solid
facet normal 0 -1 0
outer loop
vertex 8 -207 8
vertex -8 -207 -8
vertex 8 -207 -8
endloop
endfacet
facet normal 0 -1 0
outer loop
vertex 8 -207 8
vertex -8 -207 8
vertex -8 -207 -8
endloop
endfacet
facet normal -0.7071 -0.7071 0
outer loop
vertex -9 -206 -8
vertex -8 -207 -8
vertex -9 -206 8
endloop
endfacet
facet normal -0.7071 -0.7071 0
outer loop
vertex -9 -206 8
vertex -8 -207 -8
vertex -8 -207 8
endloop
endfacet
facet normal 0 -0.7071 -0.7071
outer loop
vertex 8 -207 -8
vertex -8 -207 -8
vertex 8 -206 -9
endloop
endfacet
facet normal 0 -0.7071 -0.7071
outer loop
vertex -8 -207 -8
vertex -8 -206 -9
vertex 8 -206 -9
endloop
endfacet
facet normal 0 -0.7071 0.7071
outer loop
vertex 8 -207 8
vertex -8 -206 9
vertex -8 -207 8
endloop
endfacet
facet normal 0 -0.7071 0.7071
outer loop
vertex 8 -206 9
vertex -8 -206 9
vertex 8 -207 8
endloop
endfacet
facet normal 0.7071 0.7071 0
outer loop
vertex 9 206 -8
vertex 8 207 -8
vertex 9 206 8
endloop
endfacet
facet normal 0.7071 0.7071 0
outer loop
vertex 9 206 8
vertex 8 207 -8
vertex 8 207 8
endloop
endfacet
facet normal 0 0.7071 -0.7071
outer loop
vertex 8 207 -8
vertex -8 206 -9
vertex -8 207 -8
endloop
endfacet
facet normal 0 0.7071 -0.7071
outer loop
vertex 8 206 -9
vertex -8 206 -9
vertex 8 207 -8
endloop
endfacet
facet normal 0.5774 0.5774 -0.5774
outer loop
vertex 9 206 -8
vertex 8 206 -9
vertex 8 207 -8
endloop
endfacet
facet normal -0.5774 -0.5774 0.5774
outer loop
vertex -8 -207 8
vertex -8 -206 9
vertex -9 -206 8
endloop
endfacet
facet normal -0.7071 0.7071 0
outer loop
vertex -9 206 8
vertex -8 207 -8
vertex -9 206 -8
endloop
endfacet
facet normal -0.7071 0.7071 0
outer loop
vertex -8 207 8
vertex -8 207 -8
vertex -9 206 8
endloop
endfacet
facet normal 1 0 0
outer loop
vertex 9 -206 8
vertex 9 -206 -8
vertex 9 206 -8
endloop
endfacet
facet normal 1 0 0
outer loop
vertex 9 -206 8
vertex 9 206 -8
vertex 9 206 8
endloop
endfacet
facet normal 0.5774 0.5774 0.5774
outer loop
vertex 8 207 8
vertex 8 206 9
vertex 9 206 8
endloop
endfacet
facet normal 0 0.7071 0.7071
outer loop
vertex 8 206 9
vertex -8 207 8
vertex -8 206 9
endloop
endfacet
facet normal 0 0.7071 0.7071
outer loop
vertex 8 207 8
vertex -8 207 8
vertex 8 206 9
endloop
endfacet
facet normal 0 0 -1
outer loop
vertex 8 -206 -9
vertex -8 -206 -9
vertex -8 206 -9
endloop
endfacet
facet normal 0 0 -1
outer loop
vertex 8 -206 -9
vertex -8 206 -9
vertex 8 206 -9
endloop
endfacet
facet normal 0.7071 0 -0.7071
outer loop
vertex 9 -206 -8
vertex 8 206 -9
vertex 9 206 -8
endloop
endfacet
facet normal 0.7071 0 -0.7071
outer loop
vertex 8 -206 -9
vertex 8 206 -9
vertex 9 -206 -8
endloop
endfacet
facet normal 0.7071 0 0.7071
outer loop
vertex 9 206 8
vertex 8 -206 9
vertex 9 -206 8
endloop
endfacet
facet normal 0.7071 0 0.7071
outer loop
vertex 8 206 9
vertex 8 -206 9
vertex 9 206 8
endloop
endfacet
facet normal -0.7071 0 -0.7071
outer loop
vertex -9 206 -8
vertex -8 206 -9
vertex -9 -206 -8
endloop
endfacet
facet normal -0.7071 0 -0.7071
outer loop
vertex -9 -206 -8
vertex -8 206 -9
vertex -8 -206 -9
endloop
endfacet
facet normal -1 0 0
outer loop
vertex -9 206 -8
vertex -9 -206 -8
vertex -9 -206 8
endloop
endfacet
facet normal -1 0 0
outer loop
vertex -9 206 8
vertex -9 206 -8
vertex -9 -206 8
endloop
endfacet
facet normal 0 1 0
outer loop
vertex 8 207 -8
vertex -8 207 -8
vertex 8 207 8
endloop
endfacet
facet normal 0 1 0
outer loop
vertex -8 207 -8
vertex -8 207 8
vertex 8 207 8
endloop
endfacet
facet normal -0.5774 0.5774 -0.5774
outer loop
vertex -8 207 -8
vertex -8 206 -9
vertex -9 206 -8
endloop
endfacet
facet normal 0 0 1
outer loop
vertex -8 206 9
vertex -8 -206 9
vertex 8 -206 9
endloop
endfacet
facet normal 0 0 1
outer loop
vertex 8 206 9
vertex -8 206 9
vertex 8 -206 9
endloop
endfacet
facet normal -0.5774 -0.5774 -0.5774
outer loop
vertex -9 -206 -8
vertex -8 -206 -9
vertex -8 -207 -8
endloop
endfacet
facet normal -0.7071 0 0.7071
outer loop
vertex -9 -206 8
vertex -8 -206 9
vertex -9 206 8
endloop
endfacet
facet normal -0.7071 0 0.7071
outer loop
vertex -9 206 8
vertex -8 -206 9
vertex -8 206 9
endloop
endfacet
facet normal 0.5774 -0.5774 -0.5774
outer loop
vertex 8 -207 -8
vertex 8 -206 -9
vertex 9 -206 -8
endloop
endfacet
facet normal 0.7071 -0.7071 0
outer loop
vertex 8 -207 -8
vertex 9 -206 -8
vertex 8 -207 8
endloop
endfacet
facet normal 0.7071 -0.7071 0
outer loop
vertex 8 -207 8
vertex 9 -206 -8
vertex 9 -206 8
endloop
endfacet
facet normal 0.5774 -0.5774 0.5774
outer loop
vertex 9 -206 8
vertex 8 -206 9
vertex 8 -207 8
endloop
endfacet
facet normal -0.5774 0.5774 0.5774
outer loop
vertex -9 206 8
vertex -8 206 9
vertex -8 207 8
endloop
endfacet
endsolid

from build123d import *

# Parameters (mm, degrees)
F0_W     = 18
F0_H     = 18
F1_DEPTH = 207
F2_SIZE  = 1


with BuildPart() as f1:
    # F0 (on Front) → F1 (new body, symmetric)
    with BuildSketch(Plane.XZ):
        Rectangle(F0_W, F0_H)
    extrude(amount=F1_DEPTH, both=True)

    # F2
    f2_edges = [f1.edges().sort_by_distance(p)[0] for p in [
        (9, 0, 9),
        (-9, 0, 9),
        (9, 0, -9),
        (0, -207, -9),
        (-9, 0, -9),
        (0, 207, -9),
        (0, 207, 9),
        (0, -207, 9),
        (-9, 207, 0),
        (-9, -207, 0),
        (9, 207, 0),
        (9, -207, 0),
    ]]
    chamfer(f2_edges, length=F2_SIZE)


solid = f1.part
